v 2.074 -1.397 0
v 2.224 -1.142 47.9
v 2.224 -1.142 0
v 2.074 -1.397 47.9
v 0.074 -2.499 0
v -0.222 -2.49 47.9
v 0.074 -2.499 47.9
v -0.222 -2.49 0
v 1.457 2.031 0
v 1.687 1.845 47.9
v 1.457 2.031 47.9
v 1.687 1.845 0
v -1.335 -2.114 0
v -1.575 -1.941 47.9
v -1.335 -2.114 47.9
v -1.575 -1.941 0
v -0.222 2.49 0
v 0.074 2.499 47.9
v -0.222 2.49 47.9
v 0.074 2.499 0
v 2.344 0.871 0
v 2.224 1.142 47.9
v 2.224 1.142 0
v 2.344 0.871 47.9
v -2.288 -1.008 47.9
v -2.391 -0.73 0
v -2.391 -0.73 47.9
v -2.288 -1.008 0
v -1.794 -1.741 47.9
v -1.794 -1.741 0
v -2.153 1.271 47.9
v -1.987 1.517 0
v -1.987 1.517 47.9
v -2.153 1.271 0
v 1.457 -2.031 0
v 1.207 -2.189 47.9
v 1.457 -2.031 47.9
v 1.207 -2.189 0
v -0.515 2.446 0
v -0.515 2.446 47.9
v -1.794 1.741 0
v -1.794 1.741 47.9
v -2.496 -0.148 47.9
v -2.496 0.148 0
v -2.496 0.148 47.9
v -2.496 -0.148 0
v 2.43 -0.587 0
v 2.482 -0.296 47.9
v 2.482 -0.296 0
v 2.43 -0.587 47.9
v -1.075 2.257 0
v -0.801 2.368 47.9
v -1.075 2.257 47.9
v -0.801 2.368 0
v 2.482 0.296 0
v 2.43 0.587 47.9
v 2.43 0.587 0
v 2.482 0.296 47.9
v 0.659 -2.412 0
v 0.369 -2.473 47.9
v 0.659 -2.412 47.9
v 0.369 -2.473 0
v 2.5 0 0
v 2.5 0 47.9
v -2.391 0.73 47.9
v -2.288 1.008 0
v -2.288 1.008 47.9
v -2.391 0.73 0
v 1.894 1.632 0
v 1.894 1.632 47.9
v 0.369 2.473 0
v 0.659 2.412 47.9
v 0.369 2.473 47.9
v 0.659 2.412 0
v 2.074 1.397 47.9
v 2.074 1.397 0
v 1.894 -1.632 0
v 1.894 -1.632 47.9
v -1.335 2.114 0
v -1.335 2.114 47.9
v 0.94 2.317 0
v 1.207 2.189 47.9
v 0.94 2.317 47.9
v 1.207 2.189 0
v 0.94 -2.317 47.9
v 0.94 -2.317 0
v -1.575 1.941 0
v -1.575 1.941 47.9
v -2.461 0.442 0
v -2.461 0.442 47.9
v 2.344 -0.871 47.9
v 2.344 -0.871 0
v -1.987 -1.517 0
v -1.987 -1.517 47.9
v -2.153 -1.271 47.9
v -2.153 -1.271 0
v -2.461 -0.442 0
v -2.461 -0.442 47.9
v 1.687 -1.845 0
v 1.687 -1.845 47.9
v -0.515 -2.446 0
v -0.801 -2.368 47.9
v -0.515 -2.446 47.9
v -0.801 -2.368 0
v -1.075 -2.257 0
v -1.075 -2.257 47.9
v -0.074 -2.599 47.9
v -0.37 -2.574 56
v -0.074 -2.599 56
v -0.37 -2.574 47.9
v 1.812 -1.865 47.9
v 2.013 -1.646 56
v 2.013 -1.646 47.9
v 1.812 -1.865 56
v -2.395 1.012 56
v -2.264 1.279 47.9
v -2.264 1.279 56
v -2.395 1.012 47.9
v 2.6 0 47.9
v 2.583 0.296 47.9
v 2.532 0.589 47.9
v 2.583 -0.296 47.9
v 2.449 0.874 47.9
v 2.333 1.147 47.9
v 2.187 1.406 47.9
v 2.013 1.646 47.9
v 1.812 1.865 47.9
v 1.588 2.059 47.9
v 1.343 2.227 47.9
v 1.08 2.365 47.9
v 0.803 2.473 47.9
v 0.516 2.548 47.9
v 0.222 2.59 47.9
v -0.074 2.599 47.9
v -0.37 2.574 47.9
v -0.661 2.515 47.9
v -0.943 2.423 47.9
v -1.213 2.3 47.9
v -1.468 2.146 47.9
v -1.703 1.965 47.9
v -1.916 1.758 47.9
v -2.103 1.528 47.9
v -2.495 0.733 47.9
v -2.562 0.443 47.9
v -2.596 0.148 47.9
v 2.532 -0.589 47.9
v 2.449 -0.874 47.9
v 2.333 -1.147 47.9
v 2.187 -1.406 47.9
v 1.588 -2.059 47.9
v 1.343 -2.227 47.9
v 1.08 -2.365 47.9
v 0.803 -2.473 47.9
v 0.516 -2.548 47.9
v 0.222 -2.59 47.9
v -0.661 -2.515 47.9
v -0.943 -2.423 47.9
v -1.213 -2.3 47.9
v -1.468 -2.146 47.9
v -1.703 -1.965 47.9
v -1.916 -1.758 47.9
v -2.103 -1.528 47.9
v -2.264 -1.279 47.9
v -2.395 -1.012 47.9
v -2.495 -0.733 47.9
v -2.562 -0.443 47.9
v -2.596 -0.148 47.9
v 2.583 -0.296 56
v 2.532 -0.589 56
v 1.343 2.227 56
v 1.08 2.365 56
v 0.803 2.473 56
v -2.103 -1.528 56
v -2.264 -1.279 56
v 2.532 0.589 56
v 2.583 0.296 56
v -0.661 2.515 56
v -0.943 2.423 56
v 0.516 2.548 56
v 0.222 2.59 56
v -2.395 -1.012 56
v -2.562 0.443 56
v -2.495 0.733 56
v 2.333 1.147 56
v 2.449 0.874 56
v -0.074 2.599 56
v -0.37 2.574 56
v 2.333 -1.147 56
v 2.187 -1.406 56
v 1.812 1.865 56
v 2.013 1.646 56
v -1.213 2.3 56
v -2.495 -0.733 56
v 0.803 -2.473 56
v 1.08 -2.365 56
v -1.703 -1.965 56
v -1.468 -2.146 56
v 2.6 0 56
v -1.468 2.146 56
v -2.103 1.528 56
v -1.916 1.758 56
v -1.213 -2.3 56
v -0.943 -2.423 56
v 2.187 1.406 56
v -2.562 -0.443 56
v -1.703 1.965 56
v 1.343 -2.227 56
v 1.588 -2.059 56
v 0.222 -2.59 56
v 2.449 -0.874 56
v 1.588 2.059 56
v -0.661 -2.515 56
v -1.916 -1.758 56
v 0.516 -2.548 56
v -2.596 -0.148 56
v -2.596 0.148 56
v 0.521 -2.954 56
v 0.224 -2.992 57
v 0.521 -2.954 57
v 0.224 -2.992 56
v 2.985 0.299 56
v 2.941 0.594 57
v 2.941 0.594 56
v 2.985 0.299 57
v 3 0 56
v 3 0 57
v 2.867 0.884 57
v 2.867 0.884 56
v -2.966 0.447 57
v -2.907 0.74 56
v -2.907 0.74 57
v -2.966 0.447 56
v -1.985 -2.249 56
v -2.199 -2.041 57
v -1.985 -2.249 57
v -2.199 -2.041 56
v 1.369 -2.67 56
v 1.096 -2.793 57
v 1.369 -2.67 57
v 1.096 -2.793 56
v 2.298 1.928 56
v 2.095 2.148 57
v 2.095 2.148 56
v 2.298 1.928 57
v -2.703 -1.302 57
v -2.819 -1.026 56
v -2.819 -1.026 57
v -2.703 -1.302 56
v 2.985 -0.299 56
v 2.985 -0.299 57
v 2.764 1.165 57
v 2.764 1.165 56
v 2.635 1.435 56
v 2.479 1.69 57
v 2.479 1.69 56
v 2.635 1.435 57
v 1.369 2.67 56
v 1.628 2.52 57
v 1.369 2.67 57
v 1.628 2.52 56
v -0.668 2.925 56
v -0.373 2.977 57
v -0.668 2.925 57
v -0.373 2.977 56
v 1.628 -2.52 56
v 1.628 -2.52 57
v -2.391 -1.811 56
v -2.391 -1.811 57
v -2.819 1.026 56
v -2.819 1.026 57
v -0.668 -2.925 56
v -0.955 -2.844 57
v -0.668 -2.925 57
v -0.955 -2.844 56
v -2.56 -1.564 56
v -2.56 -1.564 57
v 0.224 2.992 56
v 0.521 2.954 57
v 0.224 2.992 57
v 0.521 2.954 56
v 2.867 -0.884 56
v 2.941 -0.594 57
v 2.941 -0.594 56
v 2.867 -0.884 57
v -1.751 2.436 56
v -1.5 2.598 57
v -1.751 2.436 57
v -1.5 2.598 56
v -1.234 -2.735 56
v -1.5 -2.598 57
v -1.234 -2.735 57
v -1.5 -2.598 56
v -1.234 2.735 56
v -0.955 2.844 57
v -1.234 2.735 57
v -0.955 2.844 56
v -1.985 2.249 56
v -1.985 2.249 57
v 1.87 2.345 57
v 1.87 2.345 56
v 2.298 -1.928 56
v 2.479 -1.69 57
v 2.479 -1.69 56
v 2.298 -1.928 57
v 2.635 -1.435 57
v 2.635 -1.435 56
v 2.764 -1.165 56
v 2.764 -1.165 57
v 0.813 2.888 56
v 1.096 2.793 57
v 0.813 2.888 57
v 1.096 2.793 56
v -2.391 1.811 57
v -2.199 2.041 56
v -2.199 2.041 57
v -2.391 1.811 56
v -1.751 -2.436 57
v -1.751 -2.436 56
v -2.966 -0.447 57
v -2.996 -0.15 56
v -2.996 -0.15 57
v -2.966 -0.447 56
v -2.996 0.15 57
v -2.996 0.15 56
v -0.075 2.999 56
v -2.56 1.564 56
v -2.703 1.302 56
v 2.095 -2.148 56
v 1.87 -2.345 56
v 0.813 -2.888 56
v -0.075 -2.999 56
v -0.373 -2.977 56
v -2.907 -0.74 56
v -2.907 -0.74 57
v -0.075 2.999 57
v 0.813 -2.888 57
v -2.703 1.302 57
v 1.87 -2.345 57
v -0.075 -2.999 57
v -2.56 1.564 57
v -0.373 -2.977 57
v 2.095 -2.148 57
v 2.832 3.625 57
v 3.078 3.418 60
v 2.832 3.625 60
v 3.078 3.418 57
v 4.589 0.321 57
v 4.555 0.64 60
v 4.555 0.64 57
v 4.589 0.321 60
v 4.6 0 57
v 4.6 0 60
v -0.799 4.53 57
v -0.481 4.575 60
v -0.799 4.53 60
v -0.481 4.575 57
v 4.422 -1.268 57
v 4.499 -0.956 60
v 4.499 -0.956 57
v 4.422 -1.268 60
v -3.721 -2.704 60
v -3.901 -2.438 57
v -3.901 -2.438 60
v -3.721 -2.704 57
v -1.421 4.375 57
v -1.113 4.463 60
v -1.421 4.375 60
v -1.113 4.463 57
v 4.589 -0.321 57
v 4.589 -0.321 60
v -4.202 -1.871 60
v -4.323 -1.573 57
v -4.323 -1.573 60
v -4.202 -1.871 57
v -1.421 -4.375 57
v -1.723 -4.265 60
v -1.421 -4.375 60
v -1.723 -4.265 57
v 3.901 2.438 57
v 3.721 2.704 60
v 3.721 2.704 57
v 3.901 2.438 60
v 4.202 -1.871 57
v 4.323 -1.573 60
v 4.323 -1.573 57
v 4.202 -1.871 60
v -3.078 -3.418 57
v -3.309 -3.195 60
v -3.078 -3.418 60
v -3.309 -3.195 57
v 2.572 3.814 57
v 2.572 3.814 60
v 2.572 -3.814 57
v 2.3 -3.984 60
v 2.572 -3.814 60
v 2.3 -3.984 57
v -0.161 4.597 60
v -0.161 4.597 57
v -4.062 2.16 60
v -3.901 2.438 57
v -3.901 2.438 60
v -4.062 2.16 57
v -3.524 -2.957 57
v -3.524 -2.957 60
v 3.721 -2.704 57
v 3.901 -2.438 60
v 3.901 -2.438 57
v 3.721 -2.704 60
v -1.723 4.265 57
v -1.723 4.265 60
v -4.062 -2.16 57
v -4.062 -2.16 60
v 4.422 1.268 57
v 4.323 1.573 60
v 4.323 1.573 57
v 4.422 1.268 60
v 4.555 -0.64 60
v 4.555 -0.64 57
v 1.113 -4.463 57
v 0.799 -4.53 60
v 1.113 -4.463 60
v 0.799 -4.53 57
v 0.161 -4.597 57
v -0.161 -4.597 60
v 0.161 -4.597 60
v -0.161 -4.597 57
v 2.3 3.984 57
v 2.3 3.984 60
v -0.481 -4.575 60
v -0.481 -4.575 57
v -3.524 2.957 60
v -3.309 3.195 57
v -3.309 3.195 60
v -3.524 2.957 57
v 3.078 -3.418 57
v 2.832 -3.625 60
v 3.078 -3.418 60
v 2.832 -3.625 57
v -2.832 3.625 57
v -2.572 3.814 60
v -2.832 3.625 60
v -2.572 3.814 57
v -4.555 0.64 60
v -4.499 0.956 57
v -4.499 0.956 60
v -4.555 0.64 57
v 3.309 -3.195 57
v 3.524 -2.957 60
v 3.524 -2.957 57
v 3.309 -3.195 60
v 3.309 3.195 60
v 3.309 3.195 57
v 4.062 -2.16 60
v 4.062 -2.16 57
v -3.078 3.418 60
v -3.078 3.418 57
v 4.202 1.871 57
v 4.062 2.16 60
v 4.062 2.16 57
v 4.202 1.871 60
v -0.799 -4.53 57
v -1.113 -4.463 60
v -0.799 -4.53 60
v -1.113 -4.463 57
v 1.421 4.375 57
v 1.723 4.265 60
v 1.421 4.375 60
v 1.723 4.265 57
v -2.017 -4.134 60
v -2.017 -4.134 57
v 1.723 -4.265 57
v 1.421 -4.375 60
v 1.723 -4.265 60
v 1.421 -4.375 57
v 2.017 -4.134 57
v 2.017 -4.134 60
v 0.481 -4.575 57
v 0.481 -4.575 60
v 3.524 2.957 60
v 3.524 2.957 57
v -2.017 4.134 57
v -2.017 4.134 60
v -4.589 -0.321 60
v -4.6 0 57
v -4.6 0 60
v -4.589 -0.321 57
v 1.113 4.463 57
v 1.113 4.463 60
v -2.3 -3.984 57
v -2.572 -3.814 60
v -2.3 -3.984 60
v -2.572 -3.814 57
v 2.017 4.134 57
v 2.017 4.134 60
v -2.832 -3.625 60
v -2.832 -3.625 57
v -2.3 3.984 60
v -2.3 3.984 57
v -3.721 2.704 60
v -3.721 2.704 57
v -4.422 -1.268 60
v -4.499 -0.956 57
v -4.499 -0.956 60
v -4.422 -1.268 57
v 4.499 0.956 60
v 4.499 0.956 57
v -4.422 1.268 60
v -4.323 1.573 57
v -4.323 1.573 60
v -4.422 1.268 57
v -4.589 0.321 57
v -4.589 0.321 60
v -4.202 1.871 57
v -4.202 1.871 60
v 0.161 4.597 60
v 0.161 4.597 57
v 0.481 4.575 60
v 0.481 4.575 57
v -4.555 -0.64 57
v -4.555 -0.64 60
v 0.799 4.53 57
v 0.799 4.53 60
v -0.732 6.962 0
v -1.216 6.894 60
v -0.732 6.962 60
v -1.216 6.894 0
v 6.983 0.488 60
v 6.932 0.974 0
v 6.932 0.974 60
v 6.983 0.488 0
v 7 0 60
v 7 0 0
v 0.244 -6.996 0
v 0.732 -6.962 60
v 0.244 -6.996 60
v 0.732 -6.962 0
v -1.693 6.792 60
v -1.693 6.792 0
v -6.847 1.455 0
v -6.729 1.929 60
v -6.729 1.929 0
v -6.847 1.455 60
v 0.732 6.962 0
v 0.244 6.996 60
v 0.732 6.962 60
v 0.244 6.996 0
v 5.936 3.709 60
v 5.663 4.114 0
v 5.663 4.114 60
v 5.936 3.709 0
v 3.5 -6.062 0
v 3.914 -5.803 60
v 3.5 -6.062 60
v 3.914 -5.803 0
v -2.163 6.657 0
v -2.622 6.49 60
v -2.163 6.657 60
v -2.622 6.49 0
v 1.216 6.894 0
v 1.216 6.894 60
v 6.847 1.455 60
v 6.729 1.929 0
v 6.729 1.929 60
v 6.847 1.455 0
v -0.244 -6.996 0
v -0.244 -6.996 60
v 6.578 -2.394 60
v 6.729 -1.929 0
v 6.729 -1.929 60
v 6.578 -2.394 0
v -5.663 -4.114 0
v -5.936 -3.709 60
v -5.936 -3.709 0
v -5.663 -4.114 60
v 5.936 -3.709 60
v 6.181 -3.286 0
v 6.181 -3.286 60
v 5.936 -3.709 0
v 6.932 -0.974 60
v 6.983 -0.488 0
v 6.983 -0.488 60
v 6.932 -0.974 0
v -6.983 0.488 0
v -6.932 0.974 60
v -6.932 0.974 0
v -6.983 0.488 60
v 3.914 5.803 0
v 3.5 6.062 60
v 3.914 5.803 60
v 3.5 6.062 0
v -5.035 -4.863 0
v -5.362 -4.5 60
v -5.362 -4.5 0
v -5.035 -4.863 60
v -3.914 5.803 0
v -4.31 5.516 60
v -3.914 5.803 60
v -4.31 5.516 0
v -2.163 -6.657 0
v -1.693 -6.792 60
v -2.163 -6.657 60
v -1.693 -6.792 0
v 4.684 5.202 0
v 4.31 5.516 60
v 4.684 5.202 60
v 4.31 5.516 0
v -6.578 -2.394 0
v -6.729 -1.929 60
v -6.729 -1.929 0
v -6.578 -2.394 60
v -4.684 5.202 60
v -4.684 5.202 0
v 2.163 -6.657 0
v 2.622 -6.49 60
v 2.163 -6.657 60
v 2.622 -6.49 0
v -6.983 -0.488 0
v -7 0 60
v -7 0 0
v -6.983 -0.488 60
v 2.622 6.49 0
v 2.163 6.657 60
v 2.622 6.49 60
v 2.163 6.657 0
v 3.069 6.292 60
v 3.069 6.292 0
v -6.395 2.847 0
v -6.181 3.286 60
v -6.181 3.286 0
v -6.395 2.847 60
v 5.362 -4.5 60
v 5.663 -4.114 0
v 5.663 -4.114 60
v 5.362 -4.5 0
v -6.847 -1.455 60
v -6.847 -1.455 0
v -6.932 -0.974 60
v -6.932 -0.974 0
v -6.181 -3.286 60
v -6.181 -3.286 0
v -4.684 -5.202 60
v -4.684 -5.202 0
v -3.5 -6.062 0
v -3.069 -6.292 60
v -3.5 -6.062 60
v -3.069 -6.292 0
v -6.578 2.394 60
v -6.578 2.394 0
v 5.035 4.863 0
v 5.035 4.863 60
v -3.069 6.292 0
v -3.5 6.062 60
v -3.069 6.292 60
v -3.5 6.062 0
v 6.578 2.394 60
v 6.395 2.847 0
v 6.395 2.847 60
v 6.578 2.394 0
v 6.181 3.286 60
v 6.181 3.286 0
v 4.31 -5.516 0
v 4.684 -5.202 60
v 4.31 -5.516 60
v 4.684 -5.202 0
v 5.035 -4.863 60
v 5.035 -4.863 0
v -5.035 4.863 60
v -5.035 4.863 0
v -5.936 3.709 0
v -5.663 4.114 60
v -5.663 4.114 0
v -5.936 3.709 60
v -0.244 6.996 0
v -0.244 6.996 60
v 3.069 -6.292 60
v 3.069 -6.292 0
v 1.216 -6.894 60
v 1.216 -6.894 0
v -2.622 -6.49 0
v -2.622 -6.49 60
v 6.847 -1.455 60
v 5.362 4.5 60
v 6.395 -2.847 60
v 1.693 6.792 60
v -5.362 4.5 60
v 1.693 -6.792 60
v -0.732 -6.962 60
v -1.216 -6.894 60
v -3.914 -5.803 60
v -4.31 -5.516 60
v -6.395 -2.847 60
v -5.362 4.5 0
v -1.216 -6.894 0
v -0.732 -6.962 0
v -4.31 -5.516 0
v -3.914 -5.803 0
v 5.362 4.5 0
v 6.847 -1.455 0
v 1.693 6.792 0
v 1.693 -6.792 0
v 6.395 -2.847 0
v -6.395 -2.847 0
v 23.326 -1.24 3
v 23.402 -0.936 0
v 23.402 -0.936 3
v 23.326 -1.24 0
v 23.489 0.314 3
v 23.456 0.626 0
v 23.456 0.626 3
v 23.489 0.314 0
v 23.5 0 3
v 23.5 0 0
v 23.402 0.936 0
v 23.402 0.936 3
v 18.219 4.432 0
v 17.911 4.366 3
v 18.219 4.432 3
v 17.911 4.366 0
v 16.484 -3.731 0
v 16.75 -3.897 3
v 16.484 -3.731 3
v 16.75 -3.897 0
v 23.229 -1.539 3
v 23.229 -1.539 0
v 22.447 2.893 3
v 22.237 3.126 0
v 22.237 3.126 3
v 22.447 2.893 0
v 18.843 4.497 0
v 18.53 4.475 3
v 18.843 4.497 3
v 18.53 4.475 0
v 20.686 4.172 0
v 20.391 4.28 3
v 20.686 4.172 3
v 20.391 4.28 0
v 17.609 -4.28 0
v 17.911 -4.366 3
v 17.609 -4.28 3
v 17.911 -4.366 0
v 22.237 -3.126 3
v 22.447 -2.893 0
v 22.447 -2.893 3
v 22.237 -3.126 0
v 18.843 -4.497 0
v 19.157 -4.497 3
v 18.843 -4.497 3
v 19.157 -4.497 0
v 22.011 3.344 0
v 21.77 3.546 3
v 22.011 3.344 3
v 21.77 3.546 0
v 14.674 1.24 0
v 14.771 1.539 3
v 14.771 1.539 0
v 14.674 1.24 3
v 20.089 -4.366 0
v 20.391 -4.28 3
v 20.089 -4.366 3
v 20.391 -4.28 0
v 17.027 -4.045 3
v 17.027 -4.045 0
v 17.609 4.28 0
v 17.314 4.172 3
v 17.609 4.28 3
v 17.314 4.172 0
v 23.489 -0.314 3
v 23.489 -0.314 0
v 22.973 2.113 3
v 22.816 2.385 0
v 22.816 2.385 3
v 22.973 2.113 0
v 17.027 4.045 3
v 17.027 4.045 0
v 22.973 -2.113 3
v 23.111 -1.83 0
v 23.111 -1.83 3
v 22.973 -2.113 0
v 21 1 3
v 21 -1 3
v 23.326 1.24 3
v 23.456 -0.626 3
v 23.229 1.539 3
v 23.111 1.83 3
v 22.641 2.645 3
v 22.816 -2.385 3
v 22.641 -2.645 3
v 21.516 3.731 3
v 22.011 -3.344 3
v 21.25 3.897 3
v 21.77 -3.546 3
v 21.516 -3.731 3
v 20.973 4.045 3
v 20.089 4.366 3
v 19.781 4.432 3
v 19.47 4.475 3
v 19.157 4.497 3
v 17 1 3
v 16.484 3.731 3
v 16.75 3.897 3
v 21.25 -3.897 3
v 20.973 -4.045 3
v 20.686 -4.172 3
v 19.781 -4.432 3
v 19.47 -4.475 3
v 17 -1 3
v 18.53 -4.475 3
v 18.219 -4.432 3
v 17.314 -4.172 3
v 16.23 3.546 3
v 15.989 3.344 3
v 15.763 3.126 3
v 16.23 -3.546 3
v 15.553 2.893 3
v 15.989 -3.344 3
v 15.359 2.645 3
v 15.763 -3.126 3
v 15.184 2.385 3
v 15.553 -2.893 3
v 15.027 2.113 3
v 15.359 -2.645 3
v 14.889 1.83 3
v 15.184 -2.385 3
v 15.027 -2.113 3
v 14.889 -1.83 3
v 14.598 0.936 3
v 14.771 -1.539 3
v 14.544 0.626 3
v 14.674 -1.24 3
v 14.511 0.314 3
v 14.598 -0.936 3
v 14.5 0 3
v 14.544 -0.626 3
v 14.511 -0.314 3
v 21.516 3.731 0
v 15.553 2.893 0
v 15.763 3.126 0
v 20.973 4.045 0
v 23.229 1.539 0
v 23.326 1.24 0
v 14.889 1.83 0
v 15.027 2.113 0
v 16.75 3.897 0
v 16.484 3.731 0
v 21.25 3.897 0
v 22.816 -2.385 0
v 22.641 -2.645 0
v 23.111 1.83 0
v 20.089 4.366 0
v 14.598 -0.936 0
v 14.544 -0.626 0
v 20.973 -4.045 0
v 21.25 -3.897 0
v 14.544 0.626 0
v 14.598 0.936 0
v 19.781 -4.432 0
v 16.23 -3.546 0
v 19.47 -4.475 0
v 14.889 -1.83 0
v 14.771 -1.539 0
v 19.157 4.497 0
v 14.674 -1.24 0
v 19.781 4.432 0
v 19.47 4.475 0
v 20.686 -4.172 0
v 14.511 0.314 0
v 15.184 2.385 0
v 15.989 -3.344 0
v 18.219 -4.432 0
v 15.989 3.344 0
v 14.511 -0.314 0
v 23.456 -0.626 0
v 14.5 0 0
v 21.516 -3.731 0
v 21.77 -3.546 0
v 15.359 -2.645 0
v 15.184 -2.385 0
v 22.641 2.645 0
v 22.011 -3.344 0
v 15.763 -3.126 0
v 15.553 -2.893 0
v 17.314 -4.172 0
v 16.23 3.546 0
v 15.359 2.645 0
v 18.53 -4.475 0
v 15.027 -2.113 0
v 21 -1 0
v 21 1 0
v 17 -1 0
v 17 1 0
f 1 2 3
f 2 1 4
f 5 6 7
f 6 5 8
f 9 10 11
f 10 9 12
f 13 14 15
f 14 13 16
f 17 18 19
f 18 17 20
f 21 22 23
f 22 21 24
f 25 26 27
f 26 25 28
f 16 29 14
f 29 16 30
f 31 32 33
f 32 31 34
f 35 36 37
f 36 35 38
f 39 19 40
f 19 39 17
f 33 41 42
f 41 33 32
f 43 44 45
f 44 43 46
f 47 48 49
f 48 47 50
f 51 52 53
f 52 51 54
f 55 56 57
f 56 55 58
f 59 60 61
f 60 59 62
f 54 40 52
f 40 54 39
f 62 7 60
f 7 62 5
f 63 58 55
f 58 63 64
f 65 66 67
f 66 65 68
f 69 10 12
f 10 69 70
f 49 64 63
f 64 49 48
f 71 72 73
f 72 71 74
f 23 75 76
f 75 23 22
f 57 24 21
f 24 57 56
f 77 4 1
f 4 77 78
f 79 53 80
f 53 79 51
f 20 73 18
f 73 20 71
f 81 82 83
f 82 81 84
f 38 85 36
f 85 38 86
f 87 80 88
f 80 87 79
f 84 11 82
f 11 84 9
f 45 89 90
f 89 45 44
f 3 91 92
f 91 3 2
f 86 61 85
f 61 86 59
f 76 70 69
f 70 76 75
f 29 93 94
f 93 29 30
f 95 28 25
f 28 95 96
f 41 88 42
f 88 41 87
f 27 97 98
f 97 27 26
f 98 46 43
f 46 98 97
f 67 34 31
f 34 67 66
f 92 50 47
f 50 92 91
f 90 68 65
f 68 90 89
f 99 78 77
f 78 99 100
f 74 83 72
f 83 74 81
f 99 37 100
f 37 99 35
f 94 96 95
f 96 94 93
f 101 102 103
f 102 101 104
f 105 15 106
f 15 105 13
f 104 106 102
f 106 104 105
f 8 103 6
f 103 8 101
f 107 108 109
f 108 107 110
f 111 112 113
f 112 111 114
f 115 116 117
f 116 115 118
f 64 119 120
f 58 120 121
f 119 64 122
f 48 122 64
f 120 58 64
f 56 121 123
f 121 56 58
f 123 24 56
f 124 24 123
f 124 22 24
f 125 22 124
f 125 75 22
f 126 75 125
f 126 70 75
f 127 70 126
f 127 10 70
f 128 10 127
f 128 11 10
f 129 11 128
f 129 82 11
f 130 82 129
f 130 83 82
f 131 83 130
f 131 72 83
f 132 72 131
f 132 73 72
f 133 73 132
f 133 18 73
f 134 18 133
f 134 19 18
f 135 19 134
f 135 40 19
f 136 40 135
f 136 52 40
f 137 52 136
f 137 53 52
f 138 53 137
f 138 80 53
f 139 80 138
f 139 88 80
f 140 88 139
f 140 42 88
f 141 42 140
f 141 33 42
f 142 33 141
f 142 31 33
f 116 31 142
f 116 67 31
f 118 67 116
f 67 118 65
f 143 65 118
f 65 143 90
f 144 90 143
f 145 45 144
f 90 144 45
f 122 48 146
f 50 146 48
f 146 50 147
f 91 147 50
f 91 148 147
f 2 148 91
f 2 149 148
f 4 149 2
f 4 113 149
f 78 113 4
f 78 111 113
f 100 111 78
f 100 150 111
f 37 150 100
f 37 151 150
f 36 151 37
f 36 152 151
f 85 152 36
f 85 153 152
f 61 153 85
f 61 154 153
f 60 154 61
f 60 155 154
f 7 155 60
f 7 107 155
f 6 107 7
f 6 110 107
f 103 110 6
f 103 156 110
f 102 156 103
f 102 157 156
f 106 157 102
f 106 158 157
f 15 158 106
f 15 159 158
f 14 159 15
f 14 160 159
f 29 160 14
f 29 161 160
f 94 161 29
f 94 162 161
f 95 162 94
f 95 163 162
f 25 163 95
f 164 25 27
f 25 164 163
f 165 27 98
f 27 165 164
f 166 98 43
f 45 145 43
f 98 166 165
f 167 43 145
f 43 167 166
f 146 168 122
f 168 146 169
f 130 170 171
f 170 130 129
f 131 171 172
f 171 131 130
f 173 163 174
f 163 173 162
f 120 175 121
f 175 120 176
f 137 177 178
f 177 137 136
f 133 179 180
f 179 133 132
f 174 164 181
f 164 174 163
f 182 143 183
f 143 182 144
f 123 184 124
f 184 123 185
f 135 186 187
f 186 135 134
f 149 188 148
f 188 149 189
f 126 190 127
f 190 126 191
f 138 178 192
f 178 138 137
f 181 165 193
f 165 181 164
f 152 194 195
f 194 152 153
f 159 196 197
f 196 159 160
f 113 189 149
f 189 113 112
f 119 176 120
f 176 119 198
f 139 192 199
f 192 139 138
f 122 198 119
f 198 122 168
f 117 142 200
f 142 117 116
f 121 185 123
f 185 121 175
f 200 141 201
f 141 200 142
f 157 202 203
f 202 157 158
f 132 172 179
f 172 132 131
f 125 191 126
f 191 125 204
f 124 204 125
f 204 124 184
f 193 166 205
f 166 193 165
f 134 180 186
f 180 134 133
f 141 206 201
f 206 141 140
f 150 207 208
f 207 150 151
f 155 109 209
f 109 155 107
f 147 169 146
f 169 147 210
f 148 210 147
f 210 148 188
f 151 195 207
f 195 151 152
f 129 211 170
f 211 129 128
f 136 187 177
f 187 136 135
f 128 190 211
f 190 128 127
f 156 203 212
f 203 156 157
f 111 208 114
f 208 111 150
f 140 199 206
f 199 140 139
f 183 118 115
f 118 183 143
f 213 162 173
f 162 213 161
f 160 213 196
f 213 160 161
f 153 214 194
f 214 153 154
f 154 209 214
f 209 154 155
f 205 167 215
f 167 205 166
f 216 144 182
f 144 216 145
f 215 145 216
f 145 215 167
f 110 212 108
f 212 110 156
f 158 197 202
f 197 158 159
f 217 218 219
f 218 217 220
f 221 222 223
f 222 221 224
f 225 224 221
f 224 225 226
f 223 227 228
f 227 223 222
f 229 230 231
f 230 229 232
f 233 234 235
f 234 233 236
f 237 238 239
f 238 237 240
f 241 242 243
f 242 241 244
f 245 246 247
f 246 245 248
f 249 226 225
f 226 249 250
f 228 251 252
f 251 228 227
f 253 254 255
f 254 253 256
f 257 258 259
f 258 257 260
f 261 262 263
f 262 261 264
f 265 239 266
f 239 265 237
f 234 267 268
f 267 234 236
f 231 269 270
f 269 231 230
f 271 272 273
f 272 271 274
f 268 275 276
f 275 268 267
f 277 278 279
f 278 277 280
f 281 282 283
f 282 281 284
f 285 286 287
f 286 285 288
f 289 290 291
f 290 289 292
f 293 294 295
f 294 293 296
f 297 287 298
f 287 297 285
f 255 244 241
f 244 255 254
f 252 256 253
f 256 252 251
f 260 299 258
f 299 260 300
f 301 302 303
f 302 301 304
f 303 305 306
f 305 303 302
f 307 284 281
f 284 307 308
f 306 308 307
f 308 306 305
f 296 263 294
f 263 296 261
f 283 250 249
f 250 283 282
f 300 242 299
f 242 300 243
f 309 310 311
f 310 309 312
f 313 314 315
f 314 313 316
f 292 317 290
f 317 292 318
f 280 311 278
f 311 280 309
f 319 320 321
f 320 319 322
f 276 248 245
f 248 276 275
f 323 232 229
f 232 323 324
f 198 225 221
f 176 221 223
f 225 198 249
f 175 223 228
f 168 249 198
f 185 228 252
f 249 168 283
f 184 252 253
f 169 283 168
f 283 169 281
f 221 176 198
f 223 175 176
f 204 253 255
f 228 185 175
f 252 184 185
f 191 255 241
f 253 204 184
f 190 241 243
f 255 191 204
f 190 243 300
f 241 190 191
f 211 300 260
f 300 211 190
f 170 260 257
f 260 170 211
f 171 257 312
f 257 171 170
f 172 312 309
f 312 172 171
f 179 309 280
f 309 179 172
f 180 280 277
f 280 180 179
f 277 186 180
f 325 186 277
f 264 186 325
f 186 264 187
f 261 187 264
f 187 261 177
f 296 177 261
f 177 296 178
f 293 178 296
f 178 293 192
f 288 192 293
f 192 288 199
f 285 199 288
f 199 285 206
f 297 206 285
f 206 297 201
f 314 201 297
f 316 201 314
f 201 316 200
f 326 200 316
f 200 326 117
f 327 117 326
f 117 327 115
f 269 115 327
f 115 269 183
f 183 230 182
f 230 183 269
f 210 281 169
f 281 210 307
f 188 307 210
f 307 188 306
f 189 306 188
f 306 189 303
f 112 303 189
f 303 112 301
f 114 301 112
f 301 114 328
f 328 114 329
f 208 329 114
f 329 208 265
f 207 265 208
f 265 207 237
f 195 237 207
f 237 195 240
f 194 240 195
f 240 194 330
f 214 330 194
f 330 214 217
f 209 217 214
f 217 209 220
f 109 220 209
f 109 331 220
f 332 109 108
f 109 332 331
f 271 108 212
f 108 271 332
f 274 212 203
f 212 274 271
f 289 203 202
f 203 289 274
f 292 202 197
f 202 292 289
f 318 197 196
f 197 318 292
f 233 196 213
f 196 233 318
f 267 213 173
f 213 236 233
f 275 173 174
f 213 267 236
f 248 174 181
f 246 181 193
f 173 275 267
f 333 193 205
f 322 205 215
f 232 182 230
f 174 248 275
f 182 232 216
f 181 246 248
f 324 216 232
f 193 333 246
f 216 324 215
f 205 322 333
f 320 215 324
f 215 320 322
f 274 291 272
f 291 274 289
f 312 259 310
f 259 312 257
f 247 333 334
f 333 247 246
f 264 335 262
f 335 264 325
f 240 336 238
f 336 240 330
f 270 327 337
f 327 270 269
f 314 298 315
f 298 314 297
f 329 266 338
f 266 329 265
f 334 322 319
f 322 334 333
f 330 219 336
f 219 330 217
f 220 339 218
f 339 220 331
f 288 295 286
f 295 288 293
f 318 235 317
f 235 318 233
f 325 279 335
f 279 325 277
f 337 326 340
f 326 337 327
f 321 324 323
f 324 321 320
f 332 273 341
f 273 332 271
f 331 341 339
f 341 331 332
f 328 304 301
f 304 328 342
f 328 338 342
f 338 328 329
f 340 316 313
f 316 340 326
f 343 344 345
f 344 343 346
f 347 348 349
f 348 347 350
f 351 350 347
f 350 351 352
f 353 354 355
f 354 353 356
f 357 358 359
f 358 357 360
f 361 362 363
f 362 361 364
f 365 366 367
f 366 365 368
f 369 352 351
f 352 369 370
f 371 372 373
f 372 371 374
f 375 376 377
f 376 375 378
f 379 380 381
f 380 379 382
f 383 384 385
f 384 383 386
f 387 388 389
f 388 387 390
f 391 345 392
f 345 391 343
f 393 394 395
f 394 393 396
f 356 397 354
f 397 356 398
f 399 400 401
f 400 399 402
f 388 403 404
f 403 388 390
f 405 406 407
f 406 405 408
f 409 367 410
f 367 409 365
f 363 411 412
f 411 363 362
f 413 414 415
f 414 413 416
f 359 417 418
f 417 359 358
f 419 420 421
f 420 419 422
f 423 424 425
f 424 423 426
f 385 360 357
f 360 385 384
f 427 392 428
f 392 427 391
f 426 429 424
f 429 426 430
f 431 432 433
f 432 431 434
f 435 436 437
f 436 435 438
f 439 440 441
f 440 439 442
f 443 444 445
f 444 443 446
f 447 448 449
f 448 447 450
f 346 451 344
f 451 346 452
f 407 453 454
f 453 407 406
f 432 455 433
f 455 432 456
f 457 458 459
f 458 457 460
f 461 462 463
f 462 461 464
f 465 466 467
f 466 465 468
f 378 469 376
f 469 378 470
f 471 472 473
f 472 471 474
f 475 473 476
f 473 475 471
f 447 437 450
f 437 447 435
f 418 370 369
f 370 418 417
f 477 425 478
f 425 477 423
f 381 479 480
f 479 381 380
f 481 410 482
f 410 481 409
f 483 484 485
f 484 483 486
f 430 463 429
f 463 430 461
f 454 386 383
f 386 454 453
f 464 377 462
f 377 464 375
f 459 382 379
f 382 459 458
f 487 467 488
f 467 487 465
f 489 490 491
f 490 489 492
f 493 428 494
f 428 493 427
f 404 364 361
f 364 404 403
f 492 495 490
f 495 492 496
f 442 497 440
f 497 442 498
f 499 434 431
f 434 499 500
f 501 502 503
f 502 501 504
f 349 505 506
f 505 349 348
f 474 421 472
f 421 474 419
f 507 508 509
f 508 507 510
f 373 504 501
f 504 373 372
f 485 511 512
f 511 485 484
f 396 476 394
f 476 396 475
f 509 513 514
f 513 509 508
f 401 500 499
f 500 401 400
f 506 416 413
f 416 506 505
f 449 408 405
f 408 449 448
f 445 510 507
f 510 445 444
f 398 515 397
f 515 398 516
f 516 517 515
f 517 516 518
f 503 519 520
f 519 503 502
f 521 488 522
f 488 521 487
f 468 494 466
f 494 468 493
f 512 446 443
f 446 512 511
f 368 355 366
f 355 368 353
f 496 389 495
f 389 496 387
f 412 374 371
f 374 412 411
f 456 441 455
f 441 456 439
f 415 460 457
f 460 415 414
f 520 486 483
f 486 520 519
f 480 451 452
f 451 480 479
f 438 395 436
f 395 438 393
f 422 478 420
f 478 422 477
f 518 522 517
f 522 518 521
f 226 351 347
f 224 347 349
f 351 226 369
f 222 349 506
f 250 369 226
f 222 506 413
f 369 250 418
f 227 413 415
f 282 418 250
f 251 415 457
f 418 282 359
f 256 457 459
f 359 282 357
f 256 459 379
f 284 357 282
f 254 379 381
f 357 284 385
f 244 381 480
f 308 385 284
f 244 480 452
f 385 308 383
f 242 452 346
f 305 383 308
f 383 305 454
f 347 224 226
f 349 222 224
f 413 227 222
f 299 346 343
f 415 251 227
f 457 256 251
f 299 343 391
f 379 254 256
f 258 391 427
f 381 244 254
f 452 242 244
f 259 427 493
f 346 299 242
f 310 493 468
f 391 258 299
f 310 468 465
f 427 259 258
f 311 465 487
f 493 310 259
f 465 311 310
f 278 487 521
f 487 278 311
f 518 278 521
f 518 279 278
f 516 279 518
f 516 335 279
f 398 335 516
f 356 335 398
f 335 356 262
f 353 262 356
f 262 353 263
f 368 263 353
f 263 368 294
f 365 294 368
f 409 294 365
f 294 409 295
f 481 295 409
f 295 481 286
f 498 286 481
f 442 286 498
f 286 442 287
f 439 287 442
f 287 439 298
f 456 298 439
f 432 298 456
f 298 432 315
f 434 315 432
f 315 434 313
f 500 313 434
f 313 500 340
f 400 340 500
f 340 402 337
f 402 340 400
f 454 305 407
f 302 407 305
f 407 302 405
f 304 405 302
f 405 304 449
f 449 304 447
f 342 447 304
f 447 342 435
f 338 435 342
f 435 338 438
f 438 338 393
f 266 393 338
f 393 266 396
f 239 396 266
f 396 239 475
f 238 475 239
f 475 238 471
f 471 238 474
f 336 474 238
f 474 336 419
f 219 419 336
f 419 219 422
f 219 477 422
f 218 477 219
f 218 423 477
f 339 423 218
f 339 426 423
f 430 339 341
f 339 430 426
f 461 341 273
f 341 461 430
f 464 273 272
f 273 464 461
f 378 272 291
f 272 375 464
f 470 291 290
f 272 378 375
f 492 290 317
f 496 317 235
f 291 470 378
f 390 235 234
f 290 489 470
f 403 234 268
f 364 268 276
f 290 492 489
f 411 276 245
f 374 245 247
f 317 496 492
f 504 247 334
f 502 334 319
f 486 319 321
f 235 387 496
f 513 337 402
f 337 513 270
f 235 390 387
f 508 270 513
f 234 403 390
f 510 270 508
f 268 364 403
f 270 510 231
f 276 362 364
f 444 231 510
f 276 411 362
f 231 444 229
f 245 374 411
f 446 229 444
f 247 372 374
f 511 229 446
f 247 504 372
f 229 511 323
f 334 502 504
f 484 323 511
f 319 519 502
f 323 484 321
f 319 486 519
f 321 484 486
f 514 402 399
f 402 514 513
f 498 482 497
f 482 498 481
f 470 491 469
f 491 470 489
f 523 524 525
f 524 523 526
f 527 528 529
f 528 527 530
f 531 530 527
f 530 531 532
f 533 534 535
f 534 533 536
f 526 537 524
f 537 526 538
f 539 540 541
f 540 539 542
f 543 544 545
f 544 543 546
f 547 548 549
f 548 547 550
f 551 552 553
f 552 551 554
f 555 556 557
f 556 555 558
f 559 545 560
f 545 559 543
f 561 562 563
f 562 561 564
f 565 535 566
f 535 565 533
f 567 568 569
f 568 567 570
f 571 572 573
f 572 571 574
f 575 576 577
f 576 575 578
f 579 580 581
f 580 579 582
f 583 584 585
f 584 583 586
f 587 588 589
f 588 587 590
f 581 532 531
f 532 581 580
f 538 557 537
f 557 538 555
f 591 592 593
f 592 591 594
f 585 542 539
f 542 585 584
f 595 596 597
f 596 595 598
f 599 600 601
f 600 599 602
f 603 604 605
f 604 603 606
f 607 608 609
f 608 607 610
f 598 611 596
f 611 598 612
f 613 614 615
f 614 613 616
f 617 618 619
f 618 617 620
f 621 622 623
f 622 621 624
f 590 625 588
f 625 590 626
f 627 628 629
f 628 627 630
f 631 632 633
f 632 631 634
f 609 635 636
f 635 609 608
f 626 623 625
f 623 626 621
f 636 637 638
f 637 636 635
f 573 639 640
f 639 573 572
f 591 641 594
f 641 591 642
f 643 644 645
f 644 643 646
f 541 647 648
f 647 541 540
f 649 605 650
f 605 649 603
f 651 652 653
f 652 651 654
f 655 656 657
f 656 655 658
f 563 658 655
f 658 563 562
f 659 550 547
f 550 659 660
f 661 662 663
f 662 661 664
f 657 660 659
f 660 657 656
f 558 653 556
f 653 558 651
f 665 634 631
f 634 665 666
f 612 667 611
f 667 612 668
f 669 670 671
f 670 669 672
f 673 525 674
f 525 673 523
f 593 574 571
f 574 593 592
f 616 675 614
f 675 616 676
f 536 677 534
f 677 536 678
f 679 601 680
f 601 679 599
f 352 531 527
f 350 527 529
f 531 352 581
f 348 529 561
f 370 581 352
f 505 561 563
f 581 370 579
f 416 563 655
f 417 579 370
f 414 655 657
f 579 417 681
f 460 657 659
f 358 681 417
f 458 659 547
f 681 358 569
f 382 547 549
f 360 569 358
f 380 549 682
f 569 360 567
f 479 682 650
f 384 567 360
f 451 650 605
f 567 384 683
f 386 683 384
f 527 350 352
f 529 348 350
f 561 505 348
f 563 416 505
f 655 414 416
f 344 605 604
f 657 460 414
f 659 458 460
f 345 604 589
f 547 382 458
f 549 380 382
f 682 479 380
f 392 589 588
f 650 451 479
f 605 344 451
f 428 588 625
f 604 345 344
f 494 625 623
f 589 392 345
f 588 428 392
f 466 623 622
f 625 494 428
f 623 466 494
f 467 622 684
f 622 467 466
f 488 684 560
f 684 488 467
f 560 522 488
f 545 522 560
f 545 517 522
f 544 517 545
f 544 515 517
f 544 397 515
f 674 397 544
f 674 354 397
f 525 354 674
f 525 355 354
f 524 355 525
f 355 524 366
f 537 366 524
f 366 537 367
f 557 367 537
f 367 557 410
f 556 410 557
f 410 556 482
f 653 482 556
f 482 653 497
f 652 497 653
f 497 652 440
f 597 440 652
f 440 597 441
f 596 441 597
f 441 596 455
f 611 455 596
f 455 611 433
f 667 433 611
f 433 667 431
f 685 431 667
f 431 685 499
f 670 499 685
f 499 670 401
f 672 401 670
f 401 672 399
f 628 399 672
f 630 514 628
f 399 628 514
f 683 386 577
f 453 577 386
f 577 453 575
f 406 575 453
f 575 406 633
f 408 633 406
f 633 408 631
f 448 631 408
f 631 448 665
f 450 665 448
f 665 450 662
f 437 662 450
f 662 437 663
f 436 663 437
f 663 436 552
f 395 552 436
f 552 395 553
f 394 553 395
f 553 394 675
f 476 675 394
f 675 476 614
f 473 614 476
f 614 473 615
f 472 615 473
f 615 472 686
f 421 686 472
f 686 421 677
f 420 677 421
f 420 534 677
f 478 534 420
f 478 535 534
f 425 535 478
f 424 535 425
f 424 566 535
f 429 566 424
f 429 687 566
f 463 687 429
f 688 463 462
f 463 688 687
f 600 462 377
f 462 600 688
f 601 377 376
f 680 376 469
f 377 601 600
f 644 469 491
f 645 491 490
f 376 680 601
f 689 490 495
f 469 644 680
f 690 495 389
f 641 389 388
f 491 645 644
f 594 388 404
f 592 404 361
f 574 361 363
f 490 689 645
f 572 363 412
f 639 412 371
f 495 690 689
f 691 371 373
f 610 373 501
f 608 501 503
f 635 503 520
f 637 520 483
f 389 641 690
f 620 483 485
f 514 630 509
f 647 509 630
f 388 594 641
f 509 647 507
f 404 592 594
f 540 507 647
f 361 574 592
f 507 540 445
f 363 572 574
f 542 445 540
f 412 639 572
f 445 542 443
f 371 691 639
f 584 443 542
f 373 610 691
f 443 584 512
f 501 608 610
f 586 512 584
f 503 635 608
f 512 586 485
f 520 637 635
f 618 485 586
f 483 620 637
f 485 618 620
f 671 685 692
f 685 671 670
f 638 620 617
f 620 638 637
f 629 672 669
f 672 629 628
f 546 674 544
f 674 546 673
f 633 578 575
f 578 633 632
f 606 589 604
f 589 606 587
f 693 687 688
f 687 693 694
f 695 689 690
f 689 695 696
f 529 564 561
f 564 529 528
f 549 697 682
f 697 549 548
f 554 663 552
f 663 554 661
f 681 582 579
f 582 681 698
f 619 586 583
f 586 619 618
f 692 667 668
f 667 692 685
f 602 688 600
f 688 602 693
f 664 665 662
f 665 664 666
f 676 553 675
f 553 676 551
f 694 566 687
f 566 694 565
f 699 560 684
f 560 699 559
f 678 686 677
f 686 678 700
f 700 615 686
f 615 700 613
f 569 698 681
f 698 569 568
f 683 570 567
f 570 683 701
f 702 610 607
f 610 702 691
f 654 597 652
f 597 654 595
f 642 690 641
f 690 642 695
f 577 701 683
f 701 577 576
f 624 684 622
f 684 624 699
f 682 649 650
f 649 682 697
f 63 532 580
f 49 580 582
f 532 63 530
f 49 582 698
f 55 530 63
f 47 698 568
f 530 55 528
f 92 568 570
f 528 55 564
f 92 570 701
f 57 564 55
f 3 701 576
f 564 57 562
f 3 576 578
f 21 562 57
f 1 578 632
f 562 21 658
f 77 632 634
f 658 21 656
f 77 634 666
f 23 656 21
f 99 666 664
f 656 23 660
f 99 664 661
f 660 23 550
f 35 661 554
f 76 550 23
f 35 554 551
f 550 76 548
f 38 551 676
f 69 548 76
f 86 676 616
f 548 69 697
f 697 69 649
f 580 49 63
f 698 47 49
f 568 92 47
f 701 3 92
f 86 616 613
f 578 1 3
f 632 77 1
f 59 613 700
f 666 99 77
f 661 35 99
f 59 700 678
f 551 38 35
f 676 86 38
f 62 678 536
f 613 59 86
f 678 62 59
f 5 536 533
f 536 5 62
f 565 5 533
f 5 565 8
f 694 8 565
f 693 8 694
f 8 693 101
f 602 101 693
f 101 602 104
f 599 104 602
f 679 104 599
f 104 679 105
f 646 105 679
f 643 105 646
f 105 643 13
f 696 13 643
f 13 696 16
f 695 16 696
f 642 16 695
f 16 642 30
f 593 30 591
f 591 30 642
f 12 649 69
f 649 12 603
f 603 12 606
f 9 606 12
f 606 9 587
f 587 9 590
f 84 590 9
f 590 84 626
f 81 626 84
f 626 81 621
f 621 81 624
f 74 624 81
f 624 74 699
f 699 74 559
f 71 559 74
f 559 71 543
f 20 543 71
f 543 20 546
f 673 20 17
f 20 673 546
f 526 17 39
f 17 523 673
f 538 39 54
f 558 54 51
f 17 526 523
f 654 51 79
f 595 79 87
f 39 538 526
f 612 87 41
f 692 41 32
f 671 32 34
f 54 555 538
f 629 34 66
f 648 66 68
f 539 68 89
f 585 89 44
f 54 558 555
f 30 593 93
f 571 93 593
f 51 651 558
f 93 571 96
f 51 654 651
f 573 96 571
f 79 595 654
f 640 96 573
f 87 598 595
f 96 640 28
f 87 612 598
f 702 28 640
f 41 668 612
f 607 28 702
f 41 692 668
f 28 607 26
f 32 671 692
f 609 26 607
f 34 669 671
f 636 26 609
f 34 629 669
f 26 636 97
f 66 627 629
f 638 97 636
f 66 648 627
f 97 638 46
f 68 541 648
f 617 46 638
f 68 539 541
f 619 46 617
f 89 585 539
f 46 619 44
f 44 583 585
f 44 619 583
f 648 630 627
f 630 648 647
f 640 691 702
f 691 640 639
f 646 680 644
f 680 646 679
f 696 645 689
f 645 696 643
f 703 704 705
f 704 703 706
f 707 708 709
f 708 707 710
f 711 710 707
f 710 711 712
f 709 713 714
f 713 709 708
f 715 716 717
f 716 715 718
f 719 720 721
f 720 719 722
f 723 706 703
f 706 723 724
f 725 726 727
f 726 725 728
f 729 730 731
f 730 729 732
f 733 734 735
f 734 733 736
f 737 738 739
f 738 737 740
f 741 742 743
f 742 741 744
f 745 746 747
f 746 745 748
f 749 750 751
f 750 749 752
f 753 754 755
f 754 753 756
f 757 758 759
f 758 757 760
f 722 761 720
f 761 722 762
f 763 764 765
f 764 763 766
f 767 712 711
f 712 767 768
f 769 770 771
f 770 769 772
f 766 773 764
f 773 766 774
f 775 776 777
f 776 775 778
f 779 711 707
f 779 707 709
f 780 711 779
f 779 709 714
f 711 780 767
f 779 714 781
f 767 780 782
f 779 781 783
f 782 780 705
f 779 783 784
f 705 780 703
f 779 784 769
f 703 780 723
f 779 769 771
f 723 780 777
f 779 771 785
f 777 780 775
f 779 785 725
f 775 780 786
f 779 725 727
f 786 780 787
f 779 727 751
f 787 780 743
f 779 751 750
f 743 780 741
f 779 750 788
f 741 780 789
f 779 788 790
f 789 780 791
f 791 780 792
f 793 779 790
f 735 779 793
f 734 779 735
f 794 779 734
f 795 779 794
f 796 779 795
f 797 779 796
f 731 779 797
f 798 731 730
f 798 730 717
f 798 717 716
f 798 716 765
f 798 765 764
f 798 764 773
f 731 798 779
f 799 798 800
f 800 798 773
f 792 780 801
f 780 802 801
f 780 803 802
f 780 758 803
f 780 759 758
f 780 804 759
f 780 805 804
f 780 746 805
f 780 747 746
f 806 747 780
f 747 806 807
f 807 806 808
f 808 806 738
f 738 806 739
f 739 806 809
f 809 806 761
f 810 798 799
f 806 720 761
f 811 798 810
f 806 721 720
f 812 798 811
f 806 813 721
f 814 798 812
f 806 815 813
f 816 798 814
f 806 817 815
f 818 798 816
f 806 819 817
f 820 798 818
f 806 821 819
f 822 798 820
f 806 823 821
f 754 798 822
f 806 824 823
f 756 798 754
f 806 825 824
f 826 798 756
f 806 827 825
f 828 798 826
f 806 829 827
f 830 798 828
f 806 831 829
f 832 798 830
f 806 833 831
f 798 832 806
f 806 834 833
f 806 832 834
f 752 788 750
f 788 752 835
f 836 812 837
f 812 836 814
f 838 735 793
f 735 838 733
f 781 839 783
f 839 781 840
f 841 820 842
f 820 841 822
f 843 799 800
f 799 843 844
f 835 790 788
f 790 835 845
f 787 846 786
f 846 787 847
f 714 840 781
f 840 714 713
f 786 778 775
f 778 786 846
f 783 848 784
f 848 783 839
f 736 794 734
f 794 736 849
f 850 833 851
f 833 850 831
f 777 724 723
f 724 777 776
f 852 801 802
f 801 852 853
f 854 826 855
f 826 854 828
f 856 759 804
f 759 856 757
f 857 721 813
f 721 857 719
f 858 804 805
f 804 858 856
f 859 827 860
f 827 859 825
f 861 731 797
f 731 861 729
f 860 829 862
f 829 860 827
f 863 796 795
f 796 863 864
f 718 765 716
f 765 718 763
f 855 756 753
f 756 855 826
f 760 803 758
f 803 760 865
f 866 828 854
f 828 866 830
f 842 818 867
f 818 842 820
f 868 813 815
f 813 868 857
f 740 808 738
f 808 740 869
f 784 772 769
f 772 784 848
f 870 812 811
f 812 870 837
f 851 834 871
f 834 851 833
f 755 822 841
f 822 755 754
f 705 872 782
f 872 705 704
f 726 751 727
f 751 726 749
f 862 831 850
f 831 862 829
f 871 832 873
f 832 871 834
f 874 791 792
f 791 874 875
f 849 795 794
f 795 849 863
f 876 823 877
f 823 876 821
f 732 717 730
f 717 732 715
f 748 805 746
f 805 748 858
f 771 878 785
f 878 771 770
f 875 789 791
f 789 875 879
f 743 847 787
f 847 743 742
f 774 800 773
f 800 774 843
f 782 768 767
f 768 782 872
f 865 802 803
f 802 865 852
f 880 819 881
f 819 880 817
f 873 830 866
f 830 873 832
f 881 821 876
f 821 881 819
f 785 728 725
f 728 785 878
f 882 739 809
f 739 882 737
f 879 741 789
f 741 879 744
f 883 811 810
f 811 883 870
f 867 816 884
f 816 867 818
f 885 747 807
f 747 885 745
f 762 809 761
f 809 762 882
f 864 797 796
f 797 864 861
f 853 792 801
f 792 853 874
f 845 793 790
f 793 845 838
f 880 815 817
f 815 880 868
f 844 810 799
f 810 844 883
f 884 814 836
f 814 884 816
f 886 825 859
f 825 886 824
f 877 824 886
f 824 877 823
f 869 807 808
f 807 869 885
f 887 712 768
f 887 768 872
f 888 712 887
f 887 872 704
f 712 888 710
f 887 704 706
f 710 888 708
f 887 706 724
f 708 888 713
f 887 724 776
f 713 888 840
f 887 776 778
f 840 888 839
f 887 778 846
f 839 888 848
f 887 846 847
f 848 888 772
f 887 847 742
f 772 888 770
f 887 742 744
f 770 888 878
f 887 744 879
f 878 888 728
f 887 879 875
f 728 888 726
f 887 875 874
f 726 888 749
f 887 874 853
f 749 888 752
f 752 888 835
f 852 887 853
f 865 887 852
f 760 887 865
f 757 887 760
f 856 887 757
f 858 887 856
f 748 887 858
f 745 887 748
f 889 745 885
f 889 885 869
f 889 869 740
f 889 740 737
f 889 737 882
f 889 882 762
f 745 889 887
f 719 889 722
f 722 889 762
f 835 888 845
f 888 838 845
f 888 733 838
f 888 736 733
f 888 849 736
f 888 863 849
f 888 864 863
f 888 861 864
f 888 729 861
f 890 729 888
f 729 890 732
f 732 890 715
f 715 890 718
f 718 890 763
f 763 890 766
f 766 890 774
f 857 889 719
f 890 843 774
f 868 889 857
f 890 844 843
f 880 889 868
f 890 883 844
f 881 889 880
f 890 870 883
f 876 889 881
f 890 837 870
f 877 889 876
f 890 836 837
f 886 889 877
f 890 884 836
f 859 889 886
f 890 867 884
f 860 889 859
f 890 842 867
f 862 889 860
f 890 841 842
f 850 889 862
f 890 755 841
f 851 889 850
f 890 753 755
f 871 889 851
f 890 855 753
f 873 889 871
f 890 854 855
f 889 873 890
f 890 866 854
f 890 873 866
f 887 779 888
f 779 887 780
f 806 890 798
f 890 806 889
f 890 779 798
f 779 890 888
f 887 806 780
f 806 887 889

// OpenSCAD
// file: ../lib/parts.scad
// Off-the-shelf part sizes and simple ghost models for previews. Units mm.
// docs/measurements.md is the source of truth for every value here, with its source
// and status. Change both together. "unverified" values are not final.

// Mounted with the long axis horizontal and the 22.3 width vertical.
// Local frame of tt_motor_ghost(): shaft on the X axis, gearbox end towards -Y.
tt_len = 64.4;
tt_w = 22.3;
tt_clip_w = 22.6;
tt_t = 18.7;
tt_shaft_from_end = 11.0;
tt_shaft_d = 5.4;
tt_shaft_len = 9.1;
tt_boss_d = 5.5;
tt_hole_d = 2.8;
// [along length from shaft, across width from shaft]
tt_holes = [[20.1, 8.85], [20.1, -8.85], [-13.4, 0]];
tt_tab_len = 5.0;
tt_tab_w = 5.7;
// Round peg on the gearbox side, estimated from the drawing scale.
tt_peg = [11.2, 0];
tt_peg_d = 4.0;
tt_top_above_axle = max(tt_w, tt_clip_w) / 2;

wheel_d = 65;
wheel_w = 26;

caster_h = 35;
caster_wheel_d = 25;
caster_hole_d = 5;
caster_hole_spacing = [28, 23];
caster_plate = [38, 32];
caster_plate_t = 2;

// Plate underside height; the caster must reach the same height. Recompute after
// measuring wheel_d, tt_top_above_axle, motor_top_gap and caster_h.
// On the prototype an aluminium angle flange sits between plate and motor (photo
// estimate). The gap also keeps the top motor nut trap clear of the plate.
motor_top_gap = 2;
plate_underside_h = wheel_d / 2 + tt_top_above_axle + motor_top_gap;
caster_spacer_h = plate_underside_h - caster_h;

led_d = 5.0;
led_flange_d = 5.8;
led_flange_h = 1.0;
led_h = 8.6;
led_lead_pitch = 2.54;

// IR receivers: [body w, body h, depth incl. lens, lens centre above body bottom,
//     outer pin spacing, pins from back face]
tsop1730 = [10.0, 12.5, 5.8, 9.2, 7.62, 1.4];
// Upgrade option only (docs/hardware-upgrades.md). Lens height and pin offset are guesses.
tsop38238 = [5.0, 6.95, 4.8, 4.5, 5.08, 1.0];
function tsop_w(t) = t[0];
function tsop_h(t) = t[1];
function tsop_depth(t) = t[2];
function tsop_lens_h(t) = t[3];
function tsop_pin_span(t) = t[4];
function tsop_pin_back(t) = t[5];

btn_hole_d = 24;
btn_bezel_d = 30;
btn_above_panel = 10;
btn_depth = 33;
btn_nut_d = 30;

switch_body = [8.6, 3.6, 3.5];
switch_lever = [2.0, 2.0, 4.0];
switch_travel = 2.0;

cell_d = 18.5;
cell_len = 65.2;

joystick_cap_top = 32;
joystick_cap_d = 25;

// Height above the PCB top per Eagle package, for previews and clearance.
pcb_part_heights = [
    ["KEYSTONE_1049_DUAL_18650_HOLDER", 20],
    ["SINGLE_18650_HOLDER", 20],
    ["NRF24L01+", 13],
    ["NANO", 11],
    ["BA56-12EWA", 8],
    ["DIL14", 7],
    ["DIL16", 7],
    ["F/CM12P", 9.5],
    ["JOYSTICK-2AXIS-BUTTON", 17],
    ["DC-DC-STEP-UP-5V", 7],
    ["TL3XPO", 3.5],
];
function pcb_part_height(package) =
    let(i = search([package], pcb_part_heights)[0])
    is_num(i) ? pcb_part_heights[i][1] : 3;

module tt_motor_ghost() {
    color("gold") {
        translate([-tt_t / 2, -tt_shaft_from_end, -tt_w / 2]) cube([tt_t, tt_len, tt_w]);
        translate([0, -tt_shaft_from_end - tt_tab_len, 0])
            cube([3, 2 * tt_tab_len, tt_tab_w], center = true);
    }
    color("white") rotate([0, 90, 0])
        cylinder(d = tt_shaft_d, h = tt_t + 2 * tt_shaft_len, center = true);
}

module wheel_ghost() {
    color("dimgray") rotate([0, 90, 0]) cylinder(d = wheel_d, h = wheel_w, center = true);
}

// Top of the mounting plate at z = 0, wheel on the ground at z = -caster_h.
module caster_ghost() {
    color("white") {
        translate([0, 0, -caster_plate_t / 2]) cube([caster_plate.x, caster_plate.y, caster_plate_t], center = true);
        translate([0, 0, -caster_h + caster_wheel_d / 2]) rotate([0, 90, 0])
            cylinder(d = caster_wheel_d, h = 10, center = true);
        translate([-8, -4, -caster_h + caster_wheel_d / 2]) cube([16, 8, caster_h - caster_wheel_d / 2]);
    }
}

// Body bottom at z = 0, lens facing +Y.
module tsop_ghost(t = tsop1730) {
    color("black") translate([-tsop_w(t) / 2, 0, 0]) cube([tsop_w(t), tsop_depth(t), tsop_h(t)]);
    color("red") translate([0, tsop_depth(t), tsop_lens_h(t)]) sphere(1);
}

// Two receivers glued back to back, as on the prototype: one lens +Y, one -Y.
module tsop_pair_ghost(t = tsop1730) {
    tsop_ghost(t);
    rotate([0, 0, 180]) tsop_ghost(t);
}

// Flange bottom at z = 0, pointing +Z.
module led_ghost() {
    color("lightblue") {
        cylinder(d = led_flange_d, h = led_flange_h);
        cylinder(d = led_d, h = led_h - led_d / 2);
        translate([0, 0, led_h - led_d / 2]) sphere(d = led_d);
    }
}

// Panel front face at z = 0, button pointing +Z.
module arcade_button_ghost() {
    color("crimson") cylinder(d = btn_bezel_d, h = btn_above_panel);
    color("gray") translate([0, 0, -btn_depth]) cylinder(d = btn_hole_d - 1, h = btn_depth);
}

// PCB from a generated pcb_*.scad table with footprint boxes as part ghosts.
// Bottom of the PCB at z = 0. Parts named in flat_parts are only wire connection
// points on this PCB (the real part sits elsewhere) and are drawn flat.
module pcb_ghost(outline, holes, parts, flat_parts = []) {
    color("darkgreen") difference() {
        linear_extrude(pcb_thickness) polygon(outline);
        for (h = holes) translate([h[1], h[2], 0]) hole(h[3], pcb_thickness, cl = 0);
    }
    for (p = parts) {
        box = p[7];
        h = is_num(search([p[0]], flat_parts)[0]) ? 0.3 : pcb_part_height(p[1]);
        color(h > 15 ? "black" : "steelblue", 0.8)
            translate([box[0], box[1], pcb_thickness]) cube([box[2] - box[0], box[3] - box[1], h]);
    }
}
// file: ../lib/common.scad
// Shared print, fastener and helper definitions. Units mm.

$fa = 4;
$fs = 0.3;

eps = 0.01;

// Added to the diameter of holes, seats and press fits. Tune after the test prints.
clearance = 0.2;
wall_min = 1.6;
layer_h = 0.2;
bed_size = [180, 180, 180];

pcb_thickness = 1.6;
base_plate_t = 3;
// Under the PCB for through-hole leads and solder. Set from the vehicle PCB, see docs/measurements.md.
pcb_standoff_h = 2;

// ISO 4032 nuts, nominal.
m25_d = 2.5;
m25_nut_af = 5.0;
m25_nut_h = 2.0;

label_font = "Liberation Sans:style=Bold";

// Vertical hole from z = 0 to z = h.
module hole(d, h, cl = clearance) {
    translate([0, 0, -eps]) cylinder(d = d + cl, h = h + 2 * eps);
}

// Hex pocket from z = 0 to z = h, two flats parallel to X.
module nut_trap(af, h, cl = clearance) {
    translate([0, 0, -eps]) rotate([0, 0, 30])
        cylinder(d = (af + cl) / cos(30), h = h + eps, $fn = 6);
}

// Hole along +Y from y = 0 to y = h with a 45 deg roof pointing +Z,
// so it prints without support when the part's +Z is up on the printer.
module teardrop(d, h, cl = clearance) {
    r = (d + cl) / 2;
    rotate([90, 0, 0]) translate([0, 0, -h - eps])
        linear_extrude(h + 2 * eps) hull() {
            circle(r);
            translate([0, r * sqrt(2) - eps]) square(2 * eps, center = true);
        }
}

// Engraved label, top face at z = 0.
module label(txt, size = 4, depth = 0.6) {
    translate([0, 0, -depth]) linear_extrude(depth + eps)
        text(txt, size = size, font = label_font, halign = "center", valign = "center");
}

// Row from the generated pcb_*.scad parts table by element name.
function pcb_part(parts, name) = parts[search([name], parts)[0]];
// main file
// IR gun barrel: thick-wall tube, LED seated coaxially at the rear, held by a rear cap.
// Modeled in print orientation: axis on Z, muzzle on the bed at z = 0, rear at z = len.
// The LED goes in from the rear, its flange stops on a step, and the cap presses it there.

include <../lib/common.scad>
include <../lib/parts.scad>

barrel_len = 60;
barrel_bore_d = 5.0;
barrel_od = 14;
barrel_cap_d = 9;
barrel_cap_h = 3;
barrel_wire_slot = [4.0, 2.0];

function barrel_od() = barrel_od;

// Longer than the LED body so the flange, not the dome, is the stop.
led_seat_len = led_h - led_flange_h + 0.5;

module barrel(len = barrel_len, bore_d = barrel_bore_d, od = barrel_od, seat_cl = clearance) {
    assert(od - barrel_cap_d >= 2 * wall_min, "barrel wall around the cap is too thin");
    assert(len > barrel_cap_h + led_flange_h + led_seat_len + 5, "barrel too short for the LED seat");
    difference() {
        cylinder(d = od, h = len);
        barrel_bore(len, bore_d, seat_cl);
    }
}

// Kept separate so baffles or a muzzle aperture can be added here later.
module barrel_bore(len, bore_d, seat_cl) {
    flange_z = len - barrel_cap_h - led_flange_h;
    hole(bore_d, len, cl = 0);
    translate([0, 0, flange_z - led_seat_len]) cylinder(d = led_d + seat_cl, h = led_seat_len + eps);
    translate([0, 0, flange_z]) cylinder(d = led_flange_d + seat_cl, h = led_flange_h + eps);
    translate([0, 0, len - barrel_cap_h]) cylinder(d = barrel_cap_d + clearance, h = barrel_cap_h + eps);
}

// Printed flat side down; that face presses on the LED flange.
module barrel_cap() {
    difference() {
        cylinder(d = barrel_cap_d, h = barrel_cap_h);
        translate([0, 0, barrel_cap_h / 2])
            cube([barrel_wire_slot.x, barrel_wire_slot.y, barrel_cap_h + 1], center = true);
    }
}

barrel();
translate([barrel_od + 5, 0, 0]) barrel_cap();
